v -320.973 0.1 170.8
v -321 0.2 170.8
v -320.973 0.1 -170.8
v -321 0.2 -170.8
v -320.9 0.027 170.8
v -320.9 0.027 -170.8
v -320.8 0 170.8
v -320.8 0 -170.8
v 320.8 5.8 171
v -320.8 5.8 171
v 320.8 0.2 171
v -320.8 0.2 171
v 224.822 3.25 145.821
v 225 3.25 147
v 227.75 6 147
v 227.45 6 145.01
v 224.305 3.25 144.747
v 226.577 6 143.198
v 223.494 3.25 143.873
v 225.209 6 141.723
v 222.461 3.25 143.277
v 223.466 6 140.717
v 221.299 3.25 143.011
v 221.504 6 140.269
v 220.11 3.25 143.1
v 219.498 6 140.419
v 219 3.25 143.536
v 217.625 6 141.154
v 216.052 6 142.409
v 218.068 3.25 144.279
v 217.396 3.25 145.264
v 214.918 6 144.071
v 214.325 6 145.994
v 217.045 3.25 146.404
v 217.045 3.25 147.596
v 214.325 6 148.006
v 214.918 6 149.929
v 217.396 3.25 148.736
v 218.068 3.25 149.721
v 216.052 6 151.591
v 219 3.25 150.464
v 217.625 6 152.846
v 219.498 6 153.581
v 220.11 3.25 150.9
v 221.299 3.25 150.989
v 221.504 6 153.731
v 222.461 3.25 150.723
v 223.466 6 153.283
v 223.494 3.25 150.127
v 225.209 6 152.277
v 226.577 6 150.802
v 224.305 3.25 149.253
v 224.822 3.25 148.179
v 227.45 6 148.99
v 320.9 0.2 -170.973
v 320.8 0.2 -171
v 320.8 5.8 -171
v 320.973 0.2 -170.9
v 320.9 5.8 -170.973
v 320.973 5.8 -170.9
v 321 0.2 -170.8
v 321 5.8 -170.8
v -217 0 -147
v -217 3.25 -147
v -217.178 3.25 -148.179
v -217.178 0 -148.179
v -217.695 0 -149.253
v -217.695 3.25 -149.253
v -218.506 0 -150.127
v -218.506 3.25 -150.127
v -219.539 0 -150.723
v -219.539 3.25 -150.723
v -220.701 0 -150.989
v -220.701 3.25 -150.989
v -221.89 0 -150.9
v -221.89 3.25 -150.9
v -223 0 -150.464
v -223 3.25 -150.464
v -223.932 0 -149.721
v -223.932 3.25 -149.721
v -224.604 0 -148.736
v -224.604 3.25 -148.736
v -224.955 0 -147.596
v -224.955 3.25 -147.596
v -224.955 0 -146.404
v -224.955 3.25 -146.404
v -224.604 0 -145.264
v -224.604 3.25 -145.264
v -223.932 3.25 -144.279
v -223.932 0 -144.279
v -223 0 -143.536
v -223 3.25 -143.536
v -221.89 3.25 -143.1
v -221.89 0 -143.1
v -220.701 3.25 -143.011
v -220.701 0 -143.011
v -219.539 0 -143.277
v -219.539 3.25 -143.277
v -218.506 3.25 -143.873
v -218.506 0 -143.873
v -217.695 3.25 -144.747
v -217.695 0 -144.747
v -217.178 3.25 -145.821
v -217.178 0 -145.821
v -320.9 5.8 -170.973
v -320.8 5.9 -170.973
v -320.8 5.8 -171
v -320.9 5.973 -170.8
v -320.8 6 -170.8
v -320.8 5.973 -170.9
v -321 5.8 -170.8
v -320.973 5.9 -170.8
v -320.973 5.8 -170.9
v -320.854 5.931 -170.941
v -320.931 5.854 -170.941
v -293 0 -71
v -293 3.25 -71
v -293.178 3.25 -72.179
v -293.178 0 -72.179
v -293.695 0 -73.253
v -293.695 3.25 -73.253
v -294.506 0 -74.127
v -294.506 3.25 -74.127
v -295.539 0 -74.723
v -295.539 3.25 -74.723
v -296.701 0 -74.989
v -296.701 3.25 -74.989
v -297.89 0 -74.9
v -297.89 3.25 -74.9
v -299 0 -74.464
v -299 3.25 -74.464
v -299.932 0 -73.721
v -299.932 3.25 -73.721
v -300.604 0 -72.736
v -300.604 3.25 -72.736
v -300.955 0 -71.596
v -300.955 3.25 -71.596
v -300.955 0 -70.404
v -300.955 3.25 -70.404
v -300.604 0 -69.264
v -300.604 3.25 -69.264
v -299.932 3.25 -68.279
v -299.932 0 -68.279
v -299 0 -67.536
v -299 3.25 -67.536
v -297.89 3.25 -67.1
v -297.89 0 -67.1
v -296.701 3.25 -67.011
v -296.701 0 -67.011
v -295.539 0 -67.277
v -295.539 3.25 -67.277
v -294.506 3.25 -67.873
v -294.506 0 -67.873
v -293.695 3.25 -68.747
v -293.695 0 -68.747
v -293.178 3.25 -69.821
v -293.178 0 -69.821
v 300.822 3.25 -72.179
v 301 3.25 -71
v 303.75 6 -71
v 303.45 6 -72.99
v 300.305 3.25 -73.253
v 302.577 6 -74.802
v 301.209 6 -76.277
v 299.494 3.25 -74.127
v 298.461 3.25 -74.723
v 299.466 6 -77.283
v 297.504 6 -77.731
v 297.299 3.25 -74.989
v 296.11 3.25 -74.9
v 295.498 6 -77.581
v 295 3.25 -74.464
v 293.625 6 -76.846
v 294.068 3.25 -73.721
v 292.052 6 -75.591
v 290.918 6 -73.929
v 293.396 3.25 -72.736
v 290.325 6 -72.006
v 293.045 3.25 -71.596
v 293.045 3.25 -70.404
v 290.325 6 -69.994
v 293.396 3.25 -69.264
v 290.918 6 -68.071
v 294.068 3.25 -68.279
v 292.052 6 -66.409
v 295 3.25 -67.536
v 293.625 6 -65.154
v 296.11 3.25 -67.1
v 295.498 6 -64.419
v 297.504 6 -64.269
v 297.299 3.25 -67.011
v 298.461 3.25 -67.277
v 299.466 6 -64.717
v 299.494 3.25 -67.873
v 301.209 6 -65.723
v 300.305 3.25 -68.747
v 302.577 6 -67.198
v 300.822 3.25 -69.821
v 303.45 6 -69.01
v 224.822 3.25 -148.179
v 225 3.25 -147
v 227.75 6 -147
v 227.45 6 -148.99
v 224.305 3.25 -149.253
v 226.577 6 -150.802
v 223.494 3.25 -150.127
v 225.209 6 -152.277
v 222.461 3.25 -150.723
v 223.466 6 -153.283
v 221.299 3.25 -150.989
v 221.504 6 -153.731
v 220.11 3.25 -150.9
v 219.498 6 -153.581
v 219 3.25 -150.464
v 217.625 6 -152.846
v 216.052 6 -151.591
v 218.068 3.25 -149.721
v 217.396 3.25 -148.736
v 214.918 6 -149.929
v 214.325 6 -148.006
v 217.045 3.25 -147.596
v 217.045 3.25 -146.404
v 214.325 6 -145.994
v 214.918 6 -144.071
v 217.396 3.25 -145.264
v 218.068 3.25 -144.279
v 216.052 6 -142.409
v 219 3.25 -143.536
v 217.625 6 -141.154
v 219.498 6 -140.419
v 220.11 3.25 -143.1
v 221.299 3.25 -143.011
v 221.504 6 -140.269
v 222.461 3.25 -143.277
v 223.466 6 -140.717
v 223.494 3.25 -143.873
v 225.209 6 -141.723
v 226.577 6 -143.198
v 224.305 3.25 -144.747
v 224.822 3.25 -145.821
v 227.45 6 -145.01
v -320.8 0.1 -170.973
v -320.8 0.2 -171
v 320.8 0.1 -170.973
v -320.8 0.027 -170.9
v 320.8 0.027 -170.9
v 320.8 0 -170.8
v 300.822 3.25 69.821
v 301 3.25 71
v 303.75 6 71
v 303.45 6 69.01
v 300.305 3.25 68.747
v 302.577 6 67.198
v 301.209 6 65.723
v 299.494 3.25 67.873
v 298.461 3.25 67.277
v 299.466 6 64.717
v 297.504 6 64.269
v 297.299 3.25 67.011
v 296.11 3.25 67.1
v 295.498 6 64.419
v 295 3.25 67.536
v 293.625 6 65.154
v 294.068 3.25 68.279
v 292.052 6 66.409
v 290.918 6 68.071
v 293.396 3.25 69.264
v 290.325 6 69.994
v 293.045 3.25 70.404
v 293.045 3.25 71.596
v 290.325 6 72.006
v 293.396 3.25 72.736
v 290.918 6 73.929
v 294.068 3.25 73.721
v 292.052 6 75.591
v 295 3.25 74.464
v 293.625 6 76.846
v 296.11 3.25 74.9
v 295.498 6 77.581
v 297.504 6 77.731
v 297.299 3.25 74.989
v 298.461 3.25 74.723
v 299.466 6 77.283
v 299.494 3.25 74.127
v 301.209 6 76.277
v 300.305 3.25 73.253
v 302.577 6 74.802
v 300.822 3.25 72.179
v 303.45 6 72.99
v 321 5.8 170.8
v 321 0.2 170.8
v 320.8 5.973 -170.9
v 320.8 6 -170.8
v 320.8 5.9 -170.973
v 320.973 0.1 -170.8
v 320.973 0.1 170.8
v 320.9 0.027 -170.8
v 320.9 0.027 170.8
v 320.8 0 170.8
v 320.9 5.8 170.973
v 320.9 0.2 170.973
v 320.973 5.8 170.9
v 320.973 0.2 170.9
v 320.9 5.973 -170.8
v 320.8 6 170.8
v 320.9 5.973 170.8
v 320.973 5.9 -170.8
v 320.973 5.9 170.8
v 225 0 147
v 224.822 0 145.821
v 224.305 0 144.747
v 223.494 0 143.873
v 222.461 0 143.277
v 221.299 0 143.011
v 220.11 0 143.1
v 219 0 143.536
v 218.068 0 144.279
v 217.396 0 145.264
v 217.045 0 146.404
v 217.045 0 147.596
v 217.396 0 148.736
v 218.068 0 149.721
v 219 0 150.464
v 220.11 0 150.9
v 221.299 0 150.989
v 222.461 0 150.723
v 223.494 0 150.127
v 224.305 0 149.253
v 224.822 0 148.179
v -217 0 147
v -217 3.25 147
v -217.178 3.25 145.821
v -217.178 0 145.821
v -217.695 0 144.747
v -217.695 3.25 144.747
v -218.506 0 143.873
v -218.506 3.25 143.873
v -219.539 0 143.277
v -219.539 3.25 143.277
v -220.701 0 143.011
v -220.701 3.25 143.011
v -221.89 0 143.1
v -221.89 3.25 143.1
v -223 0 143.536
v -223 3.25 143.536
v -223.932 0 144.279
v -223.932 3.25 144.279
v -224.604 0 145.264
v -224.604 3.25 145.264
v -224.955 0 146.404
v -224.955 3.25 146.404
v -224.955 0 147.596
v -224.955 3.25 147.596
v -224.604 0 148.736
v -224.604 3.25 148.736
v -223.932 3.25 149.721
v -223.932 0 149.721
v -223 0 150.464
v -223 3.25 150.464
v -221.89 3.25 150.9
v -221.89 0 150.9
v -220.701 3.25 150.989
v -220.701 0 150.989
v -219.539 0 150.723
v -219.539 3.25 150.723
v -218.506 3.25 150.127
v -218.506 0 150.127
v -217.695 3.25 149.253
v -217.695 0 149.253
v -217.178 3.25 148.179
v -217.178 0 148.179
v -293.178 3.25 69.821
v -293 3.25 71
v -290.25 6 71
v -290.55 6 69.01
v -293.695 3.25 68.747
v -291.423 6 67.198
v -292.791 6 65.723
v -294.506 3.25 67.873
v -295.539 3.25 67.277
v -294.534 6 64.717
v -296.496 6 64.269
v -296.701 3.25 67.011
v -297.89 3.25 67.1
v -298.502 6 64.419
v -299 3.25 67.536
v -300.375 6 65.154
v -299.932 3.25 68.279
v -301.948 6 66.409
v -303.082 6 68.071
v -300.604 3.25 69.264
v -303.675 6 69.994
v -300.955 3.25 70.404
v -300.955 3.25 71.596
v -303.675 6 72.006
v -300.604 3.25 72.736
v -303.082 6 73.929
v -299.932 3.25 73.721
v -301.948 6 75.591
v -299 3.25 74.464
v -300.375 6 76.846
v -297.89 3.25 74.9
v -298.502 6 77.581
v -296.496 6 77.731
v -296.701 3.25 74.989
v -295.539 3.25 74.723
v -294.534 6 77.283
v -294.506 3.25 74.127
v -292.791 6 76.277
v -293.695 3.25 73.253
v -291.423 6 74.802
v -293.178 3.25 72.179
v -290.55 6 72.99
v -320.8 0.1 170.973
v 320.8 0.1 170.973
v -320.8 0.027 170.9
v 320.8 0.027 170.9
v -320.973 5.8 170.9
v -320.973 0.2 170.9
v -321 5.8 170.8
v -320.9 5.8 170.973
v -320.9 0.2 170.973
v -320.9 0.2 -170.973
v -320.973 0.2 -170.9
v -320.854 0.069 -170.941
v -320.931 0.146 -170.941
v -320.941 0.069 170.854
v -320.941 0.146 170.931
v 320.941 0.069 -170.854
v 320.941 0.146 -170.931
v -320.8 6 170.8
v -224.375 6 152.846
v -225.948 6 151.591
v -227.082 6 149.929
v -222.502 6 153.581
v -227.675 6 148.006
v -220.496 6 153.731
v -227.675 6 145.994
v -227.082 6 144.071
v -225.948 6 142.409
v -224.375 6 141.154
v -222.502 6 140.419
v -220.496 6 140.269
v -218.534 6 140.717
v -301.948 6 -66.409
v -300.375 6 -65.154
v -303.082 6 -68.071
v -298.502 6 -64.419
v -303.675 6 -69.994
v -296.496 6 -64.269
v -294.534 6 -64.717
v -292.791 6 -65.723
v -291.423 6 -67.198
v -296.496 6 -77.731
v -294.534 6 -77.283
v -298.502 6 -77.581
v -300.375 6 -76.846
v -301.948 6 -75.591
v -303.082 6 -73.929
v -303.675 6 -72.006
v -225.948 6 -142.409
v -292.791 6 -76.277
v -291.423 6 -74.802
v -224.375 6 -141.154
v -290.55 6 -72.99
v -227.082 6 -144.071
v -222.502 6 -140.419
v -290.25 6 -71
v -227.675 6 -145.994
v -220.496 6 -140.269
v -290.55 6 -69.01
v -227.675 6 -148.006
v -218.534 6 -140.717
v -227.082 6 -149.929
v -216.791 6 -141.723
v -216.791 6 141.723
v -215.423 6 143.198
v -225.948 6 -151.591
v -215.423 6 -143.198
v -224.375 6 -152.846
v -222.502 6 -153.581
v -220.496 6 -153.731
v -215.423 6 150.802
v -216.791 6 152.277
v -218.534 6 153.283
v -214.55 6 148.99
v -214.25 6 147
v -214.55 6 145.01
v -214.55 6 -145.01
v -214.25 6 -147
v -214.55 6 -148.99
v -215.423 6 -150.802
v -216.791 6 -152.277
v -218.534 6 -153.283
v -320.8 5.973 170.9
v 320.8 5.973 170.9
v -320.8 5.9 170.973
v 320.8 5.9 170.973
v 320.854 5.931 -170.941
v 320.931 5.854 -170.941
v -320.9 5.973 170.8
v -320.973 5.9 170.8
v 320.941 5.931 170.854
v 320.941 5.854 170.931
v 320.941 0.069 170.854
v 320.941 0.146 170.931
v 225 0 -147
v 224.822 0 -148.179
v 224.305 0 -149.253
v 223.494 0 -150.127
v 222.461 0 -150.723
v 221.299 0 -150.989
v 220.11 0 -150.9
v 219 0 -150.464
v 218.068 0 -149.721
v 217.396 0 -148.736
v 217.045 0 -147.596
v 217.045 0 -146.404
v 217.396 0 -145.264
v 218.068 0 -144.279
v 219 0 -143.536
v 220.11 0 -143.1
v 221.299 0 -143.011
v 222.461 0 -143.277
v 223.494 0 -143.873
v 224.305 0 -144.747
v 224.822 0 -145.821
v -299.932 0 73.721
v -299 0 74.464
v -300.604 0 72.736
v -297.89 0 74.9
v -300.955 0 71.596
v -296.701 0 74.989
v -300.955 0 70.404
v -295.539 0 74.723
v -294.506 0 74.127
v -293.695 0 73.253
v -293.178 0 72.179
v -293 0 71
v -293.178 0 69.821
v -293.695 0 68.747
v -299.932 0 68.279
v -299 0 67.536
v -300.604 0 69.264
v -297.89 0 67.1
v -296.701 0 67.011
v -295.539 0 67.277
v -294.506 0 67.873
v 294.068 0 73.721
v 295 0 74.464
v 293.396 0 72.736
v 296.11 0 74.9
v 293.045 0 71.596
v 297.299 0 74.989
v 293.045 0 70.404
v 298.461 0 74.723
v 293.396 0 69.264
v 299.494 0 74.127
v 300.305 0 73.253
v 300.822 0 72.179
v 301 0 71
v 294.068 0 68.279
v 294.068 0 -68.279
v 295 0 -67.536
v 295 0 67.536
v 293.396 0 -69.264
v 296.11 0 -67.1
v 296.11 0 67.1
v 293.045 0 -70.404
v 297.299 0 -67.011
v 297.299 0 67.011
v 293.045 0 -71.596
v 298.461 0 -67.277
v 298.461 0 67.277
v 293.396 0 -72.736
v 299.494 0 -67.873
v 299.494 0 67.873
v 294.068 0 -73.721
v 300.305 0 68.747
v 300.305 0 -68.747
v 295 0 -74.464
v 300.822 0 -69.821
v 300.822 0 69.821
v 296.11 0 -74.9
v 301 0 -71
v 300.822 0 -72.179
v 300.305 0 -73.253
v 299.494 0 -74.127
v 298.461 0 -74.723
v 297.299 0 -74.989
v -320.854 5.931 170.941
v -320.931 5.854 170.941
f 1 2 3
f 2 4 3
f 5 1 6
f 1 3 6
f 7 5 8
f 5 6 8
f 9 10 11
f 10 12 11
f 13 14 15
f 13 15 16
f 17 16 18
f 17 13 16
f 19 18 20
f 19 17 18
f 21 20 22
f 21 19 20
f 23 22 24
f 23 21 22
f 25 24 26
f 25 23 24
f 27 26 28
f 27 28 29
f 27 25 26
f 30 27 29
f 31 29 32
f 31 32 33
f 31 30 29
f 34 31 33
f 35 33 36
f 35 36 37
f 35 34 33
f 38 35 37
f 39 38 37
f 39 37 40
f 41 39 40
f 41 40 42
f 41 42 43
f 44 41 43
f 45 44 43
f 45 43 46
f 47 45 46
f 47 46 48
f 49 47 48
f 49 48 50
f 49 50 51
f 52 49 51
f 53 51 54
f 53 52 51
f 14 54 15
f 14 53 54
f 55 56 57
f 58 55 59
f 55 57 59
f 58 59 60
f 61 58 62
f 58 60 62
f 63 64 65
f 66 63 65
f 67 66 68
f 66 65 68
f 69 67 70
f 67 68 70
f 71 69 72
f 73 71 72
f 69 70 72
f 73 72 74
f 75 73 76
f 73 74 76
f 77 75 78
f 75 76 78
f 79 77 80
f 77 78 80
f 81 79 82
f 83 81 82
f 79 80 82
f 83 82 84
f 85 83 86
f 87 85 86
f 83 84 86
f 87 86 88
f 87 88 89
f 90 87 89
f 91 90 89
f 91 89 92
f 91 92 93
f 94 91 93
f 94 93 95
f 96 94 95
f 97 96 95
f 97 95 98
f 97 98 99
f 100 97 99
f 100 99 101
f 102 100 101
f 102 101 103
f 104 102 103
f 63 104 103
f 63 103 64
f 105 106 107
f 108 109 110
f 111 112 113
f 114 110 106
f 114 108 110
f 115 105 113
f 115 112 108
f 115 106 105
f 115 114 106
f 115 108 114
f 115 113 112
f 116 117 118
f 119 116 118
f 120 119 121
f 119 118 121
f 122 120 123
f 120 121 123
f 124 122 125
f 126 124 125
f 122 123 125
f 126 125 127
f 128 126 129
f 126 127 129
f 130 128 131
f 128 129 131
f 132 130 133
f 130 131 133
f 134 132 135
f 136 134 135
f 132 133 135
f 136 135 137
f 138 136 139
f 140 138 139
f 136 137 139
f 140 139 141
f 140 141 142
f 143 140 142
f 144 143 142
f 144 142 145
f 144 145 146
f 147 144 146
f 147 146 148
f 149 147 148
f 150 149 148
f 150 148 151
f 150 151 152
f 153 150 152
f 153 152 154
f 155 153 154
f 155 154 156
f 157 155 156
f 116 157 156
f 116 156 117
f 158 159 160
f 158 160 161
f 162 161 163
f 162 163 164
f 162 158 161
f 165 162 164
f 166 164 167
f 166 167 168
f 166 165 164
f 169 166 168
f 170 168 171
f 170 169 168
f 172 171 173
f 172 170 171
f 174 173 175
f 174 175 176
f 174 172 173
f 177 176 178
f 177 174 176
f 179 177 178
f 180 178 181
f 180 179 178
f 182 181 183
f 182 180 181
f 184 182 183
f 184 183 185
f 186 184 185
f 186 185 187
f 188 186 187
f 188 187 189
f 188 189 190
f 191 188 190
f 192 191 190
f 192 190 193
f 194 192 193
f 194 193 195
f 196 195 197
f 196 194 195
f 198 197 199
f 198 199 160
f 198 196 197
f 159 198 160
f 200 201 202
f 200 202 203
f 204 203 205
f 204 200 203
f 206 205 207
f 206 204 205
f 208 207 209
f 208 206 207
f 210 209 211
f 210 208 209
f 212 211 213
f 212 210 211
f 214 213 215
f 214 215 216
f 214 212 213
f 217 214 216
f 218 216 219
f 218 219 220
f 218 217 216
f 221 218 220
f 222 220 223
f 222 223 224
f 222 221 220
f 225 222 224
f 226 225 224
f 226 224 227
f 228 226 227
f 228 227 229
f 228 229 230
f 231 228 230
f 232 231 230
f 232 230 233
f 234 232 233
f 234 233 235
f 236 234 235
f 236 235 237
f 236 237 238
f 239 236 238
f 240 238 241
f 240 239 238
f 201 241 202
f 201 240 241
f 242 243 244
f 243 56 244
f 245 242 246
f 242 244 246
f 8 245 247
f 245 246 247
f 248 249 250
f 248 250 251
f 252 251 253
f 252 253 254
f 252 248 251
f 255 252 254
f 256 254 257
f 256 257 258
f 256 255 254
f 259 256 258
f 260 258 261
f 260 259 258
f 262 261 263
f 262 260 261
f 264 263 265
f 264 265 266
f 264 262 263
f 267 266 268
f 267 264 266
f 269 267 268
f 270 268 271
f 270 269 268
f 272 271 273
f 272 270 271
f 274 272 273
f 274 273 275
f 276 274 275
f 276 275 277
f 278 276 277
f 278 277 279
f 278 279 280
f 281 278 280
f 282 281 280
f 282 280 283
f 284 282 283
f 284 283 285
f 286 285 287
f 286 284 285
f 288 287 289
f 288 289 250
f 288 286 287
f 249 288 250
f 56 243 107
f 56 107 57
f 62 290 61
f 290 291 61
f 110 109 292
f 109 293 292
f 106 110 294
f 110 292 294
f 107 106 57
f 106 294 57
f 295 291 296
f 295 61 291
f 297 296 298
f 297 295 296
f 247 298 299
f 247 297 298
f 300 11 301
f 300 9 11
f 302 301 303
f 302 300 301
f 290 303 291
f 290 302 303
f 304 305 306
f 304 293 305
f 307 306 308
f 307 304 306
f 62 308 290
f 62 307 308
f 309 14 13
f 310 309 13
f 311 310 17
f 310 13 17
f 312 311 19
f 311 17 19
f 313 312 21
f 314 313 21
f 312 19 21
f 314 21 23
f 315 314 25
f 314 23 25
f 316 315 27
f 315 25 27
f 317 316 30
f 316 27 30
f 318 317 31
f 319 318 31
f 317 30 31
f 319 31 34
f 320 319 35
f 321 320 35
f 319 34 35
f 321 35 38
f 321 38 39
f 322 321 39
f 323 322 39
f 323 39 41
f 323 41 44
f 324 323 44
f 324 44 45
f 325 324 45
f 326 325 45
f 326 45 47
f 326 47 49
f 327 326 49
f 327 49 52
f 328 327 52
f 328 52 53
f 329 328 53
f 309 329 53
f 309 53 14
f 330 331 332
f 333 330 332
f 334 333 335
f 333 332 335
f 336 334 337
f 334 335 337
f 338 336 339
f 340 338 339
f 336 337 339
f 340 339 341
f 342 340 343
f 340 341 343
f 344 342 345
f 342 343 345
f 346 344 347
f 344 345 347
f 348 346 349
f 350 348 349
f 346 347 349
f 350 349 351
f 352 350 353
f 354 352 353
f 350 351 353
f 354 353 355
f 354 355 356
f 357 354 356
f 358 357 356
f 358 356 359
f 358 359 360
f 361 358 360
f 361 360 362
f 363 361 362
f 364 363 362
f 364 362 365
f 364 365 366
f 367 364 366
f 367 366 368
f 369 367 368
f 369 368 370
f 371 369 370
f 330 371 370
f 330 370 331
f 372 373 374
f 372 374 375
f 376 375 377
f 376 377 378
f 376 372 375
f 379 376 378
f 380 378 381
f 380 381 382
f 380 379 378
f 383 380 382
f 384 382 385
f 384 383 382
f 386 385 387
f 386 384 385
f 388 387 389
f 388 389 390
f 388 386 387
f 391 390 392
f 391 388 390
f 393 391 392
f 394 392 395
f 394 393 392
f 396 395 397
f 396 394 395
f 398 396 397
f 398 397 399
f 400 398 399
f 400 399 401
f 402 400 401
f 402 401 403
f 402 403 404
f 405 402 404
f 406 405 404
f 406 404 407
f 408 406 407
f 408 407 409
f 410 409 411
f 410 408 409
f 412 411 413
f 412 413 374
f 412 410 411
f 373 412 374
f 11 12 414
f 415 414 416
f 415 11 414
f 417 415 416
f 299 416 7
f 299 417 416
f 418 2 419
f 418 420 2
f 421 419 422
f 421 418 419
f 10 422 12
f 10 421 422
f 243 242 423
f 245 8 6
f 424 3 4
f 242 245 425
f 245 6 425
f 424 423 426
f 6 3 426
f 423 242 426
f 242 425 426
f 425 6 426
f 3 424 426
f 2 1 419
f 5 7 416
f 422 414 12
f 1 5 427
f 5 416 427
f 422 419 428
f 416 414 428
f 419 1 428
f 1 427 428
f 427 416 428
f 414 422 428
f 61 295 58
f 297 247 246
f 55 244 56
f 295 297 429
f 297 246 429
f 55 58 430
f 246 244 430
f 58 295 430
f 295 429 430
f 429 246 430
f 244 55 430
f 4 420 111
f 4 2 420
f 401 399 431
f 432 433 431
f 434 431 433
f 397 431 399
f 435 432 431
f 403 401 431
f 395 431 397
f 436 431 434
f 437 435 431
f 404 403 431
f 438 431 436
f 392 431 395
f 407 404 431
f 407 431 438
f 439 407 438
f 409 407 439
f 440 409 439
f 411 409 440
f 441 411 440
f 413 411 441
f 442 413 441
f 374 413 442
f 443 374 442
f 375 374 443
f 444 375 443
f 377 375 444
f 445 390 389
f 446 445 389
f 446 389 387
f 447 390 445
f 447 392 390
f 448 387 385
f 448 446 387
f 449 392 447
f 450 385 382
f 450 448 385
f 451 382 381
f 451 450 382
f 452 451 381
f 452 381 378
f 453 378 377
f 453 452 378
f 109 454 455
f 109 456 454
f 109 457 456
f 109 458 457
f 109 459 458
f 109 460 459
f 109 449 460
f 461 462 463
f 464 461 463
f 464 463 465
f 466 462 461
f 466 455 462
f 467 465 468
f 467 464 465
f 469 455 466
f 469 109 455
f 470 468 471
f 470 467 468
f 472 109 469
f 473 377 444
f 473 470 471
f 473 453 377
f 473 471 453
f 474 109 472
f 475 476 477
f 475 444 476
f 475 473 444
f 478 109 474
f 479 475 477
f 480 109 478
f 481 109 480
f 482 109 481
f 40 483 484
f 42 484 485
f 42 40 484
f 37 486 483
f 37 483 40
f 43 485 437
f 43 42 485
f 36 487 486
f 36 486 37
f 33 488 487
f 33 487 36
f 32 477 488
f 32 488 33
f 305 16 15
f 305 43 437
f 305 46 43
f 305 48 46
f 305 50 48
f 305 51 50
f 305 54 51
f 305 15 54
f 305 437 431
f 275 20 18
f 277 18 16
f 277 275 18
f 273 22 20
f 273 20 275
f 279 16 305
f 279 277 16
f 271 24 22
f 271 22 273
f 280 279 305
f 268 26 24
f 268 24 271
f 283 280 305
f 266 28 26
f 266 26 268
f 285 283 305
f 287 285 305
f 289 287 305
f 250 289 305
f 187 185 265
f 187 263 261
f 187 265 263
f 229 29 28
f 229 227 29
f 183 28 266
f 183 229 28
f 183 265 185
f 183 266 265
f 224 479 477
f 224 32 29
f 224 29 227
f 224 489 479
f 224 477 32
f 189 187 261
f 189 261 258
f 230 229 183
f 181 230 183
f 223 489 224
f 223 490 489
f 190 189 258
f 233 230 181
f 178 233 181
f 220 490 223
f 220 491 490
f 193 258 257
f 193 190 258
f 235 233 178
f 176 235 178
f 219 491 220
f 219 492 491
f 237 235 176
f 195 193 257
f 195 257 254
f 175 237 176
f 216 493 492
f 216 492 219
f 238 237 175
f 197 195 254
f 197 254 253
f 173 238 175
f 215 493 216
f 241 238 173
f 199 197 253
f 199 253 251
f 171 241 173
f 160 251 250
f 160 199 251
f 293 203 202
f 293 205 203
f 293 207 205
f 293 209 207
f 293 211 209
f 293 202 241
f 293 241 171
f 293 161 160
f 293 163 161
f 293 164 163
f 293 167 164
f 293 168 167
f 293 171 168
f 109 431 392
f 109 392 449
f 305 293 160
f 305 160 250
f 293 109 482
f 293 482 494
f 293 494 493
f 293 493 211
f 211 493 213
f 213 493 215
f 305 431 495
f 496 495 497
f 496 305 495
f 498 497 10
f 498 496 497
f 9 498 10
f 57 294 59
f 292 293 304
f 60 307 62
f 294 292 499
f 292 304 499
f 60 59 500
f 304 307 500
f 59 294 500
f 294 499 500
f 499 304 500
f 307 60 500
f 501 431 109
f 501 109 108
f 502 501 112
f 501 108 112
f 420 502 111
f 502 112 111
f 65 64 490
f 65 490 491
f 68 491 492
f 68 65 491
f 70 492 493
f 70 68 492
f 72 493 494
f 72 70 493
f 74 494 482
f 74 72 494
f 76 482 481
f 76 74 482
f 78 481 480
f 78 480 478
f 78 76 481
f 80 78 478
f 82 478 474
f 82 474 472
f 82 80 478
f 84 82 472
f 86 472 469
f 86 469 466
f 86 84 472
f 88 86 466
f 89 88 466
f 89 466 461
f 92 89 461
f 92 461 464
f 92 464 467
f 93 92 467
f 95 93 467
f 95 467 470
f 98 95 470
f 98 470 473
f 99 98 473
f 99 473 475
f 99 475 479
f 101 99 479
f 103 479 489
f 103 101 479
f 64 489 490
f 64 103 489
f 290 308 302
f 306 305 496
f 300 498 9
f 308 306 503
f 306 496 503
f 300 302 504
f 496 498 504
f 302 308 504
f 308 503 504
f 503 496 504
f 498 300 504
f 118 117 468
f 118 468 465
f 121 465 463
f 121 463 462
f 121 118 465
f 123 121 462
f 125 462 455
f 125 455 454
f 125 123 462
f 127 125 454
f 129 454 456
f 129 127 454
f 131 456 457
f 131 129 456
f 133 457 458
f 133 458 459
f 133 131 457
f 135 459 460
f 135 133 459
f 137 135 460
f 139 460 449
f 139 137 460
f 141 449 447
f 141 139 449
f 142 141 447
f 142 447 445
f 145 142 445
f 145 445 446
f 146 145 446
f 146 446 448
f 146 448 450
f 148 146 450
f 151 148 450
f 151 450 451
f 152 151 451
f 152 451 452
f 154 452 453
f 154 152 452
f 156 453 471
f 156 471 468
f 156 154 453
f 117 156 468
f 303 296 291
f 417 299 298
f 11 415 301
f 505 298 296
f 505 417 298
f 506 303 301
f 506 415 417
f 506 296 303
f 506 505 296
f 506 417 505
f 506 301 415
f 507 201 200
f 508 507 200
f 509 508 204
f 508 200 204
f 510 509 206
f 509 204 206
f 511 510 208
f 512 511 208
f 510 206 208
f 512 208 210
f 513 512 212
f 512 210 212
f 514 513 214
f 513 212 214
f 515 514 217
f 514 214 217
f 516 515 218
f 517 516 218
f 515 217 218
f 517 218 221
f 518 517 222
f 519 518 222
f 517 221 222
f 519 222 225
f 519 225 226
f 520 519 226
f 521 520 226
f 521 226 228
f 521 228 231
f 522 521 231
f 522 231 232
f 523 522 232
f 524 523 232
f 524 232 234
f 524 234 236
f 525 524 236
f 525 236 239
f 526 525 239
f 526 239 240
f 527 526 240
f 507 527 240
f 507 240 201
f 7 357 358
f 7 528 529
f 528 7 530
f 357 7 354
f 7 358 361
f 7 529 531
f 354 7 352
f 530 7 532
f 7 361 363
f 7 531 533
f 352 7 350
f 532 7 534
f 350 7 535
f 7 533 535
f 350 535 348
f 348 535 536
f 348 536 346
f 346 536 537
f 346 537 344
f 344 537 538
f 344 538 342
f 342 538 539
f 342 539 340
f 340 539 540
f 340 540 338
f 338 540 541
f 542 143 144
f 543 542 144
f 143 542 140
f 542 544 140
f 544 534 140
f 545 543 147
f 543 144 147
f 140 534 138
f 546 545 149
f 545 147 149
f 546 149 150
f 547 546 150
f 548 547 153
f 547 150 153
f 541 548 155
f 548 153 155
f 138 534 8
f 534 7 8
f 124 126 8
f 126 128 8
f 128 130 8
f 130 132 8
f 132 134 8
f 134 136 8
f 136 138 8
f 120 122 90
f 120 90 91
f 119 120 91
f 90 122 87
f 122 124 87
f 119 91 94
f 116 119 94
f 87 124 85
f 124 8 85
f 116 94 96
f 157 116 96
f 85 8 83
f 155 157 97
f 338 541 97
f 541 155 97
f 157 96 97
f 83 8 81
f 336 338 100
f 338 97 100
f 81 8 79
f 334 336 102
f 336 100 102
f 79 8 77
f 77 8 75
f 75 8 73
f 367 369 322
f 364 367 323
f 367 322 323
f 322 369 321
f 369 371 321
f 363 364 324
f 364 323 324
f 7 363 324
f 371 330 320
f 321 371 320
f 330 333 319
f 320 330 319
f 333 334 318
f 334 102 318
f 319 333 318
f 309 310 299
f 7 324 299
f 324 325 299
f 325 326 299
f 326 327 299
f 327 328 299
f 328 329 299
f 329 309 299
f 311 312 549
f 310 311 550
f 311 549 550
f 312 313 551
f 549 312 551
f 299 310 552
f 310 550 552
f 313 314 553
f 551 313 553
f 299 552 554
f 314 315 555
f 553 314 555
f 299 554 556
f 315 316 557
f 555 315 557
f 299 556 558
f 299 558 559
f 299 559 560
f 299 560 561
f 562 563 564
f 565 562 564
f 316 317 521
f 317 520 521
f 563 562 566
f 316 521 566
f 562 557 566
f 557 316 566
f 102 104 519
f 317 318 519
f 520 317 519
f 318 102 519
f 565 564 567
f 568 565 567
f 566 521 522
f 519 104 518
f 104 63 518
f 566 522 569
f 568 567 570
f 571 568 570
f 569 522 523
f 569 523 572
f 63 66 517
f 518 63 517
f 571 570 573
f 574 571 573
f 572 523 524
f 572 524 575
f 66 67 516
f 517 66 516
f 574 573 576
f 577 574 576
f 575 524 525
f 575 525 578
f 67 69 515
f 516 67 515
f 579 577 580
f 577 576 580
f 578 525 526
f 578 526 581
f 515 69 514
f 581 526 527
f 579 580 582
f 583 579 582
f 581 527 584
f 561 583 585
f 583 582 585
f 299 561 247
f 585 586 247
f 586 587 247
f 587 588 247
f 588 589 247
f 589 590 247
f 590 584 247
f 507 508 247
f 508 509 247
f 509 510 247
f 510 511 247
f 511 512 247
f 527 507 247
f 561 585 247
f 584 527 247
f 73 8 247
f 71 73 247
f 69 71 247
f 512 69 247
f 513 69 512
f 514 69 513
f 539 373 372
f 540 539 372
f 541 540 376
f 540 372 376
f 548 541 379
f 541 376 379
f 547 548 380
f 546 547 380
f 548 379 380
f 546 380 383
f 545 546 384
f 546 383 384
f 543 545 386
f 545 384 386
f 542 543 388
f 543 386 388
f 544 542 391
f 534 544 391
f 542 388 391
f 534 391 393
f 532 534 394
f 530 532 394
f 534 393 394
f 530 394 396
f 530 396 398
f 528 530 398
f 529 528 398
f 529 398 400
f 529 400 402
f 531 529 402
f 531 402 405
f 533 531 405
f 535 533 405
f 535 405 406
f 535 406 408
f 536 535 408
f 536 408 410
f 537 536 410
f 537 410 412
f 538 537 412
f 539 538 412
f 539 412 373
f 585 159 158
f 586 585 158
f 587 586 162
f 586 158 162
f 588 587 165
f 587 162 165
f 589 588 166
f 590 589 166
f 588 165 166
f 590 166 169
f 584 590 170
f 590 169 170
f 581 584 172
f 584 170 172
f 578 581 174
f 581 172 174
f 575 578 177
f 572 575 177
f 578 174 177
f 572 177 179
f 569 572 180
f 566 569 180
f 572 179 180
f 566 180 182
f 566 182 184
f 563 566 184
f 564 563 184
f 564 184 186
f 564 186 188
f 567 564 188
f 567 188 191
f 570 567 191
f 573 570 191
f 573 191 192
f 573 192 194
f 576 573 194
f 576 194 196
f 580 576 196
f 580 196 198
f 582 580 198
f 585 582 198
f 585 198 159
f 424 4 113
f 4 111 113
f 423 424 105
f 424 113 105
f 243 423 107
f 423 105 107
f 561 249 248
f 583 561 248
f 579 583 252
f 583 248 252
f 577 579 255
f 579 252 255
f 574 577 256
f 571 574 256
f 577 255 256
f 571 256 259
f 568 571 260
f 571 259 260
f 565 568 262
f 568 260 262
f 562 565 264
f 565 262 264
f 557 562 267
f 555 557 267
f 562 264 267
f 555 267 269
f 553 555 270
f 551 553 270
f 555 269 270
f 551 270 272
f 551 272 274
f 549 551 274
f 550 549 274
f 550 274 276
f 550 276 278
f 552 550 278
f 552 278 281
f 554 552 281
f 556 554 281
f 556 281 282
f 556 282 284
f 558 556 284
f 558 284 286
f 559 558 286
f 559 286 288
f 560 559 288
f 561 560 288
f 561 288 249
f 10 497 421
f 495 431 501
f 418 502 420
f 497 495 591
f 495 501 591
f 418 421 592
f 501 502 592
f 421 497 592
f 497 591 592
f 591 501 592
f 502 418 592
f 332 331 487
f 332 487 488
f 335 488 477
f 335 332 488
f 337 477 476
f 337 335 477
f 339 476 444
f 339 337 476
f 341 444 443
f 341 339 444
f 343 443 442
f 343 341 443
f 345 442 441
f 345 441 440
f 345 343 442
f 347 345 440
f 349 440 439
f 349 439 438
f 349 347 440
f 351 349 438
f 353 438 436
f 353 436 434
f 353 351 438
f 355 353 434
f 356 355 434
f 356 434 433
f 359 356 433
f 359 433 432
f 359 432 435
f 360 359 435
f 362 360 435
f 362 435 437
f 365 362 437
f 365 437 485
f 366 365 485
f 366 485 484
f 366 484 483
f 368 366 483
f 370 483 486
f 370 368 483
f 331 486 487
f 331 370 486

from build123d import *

# Parameters (mm, degrees)
SKETCH1_W           = 642
SKETCH1_H           = 342
BOSS_EXTRUDE1_DEPTH = 6
SKETCH2_R           = 4
CUT_EXTRUDE1_DEPTH  = 7
CHAMFER1_SIZE       = 2.75
FILLET1_R           = 0.2


with BuildPart() as part:
    # Sketch1 → Boss-Extrude1 (new body)
    with BuildSketch(Plane(origin=(0, 0, 0), x_dir=(1, 0, 0), z_dir=(0, 1, 0))):
        Rectangle(SKETCH1_W, SKETCH1_H)
    extrude(amount=BOSS_EXTRUDE1_DEPTH)

    # Sketch2 → Cut-Extrude1 (cut, through all)
    with BuildSketch(Plane(origin=(0, 6, 0), x_dir=(1, 0, 0), z_dir=(0, 1, 0))):
        with Locations((-221, -147)):
            Circle(SKETCH2_R)
        with Locations((221, -147)):
            Circle(SKETCH2_R)
        with Locations((-297, -71)):
            Circle(SKETCH2_R)
        with Locations((297, -71)):
            Circle(SKETCH2_R)
        with Locations((297, 71)):
            Circle(SKETCH2_R)
        with Locations((221, 147)):
            Circle(SKETCH2_R)
        with Locations((-221, 147)):
            Circle(SKETCH2_R)
        with Locations((-297, 71)):
            Circle(SKETCH2_R)
    extrude(amount=-CUT_EXTRUDE1_DEPTH, mode=Mode.SUBTRACT)

    # Chamfer1
    chamfer1_edges = [part.edges().sort_by_distance(p)[0] for p in [
        (-225, 6, 147),
        (217, 6, 147),
        (-301, 6, 71),
        (293, 6, 71),
        (293, 6, -71),
        (217, 6, -147),
        (-225, 6, -147),
        (-301, 6, -71),
    ]]
    chamfer(chamfer1_edges, length=CHAMFER1_SIZE)

    # Fillet1
    fillet1_edges = [part.edges().sort_by_distance(p)[0] for p in [
        (-321, 6, 0),
        (0, 6, 171),
        (321, 6, 0),
        (0, 0, 171),
        (-321, 0, 0),
        (0, 0, -171),
        (321, 0, 0),
        (0, 6, -171),
        (321, 3, 171),
        (-321, 3, 171),
        (-321, 3, -171),
        (321, 3, -171),
    ]]
    fillet(fillet1_edges, radius=FILLET1_R)


solid = part.part
